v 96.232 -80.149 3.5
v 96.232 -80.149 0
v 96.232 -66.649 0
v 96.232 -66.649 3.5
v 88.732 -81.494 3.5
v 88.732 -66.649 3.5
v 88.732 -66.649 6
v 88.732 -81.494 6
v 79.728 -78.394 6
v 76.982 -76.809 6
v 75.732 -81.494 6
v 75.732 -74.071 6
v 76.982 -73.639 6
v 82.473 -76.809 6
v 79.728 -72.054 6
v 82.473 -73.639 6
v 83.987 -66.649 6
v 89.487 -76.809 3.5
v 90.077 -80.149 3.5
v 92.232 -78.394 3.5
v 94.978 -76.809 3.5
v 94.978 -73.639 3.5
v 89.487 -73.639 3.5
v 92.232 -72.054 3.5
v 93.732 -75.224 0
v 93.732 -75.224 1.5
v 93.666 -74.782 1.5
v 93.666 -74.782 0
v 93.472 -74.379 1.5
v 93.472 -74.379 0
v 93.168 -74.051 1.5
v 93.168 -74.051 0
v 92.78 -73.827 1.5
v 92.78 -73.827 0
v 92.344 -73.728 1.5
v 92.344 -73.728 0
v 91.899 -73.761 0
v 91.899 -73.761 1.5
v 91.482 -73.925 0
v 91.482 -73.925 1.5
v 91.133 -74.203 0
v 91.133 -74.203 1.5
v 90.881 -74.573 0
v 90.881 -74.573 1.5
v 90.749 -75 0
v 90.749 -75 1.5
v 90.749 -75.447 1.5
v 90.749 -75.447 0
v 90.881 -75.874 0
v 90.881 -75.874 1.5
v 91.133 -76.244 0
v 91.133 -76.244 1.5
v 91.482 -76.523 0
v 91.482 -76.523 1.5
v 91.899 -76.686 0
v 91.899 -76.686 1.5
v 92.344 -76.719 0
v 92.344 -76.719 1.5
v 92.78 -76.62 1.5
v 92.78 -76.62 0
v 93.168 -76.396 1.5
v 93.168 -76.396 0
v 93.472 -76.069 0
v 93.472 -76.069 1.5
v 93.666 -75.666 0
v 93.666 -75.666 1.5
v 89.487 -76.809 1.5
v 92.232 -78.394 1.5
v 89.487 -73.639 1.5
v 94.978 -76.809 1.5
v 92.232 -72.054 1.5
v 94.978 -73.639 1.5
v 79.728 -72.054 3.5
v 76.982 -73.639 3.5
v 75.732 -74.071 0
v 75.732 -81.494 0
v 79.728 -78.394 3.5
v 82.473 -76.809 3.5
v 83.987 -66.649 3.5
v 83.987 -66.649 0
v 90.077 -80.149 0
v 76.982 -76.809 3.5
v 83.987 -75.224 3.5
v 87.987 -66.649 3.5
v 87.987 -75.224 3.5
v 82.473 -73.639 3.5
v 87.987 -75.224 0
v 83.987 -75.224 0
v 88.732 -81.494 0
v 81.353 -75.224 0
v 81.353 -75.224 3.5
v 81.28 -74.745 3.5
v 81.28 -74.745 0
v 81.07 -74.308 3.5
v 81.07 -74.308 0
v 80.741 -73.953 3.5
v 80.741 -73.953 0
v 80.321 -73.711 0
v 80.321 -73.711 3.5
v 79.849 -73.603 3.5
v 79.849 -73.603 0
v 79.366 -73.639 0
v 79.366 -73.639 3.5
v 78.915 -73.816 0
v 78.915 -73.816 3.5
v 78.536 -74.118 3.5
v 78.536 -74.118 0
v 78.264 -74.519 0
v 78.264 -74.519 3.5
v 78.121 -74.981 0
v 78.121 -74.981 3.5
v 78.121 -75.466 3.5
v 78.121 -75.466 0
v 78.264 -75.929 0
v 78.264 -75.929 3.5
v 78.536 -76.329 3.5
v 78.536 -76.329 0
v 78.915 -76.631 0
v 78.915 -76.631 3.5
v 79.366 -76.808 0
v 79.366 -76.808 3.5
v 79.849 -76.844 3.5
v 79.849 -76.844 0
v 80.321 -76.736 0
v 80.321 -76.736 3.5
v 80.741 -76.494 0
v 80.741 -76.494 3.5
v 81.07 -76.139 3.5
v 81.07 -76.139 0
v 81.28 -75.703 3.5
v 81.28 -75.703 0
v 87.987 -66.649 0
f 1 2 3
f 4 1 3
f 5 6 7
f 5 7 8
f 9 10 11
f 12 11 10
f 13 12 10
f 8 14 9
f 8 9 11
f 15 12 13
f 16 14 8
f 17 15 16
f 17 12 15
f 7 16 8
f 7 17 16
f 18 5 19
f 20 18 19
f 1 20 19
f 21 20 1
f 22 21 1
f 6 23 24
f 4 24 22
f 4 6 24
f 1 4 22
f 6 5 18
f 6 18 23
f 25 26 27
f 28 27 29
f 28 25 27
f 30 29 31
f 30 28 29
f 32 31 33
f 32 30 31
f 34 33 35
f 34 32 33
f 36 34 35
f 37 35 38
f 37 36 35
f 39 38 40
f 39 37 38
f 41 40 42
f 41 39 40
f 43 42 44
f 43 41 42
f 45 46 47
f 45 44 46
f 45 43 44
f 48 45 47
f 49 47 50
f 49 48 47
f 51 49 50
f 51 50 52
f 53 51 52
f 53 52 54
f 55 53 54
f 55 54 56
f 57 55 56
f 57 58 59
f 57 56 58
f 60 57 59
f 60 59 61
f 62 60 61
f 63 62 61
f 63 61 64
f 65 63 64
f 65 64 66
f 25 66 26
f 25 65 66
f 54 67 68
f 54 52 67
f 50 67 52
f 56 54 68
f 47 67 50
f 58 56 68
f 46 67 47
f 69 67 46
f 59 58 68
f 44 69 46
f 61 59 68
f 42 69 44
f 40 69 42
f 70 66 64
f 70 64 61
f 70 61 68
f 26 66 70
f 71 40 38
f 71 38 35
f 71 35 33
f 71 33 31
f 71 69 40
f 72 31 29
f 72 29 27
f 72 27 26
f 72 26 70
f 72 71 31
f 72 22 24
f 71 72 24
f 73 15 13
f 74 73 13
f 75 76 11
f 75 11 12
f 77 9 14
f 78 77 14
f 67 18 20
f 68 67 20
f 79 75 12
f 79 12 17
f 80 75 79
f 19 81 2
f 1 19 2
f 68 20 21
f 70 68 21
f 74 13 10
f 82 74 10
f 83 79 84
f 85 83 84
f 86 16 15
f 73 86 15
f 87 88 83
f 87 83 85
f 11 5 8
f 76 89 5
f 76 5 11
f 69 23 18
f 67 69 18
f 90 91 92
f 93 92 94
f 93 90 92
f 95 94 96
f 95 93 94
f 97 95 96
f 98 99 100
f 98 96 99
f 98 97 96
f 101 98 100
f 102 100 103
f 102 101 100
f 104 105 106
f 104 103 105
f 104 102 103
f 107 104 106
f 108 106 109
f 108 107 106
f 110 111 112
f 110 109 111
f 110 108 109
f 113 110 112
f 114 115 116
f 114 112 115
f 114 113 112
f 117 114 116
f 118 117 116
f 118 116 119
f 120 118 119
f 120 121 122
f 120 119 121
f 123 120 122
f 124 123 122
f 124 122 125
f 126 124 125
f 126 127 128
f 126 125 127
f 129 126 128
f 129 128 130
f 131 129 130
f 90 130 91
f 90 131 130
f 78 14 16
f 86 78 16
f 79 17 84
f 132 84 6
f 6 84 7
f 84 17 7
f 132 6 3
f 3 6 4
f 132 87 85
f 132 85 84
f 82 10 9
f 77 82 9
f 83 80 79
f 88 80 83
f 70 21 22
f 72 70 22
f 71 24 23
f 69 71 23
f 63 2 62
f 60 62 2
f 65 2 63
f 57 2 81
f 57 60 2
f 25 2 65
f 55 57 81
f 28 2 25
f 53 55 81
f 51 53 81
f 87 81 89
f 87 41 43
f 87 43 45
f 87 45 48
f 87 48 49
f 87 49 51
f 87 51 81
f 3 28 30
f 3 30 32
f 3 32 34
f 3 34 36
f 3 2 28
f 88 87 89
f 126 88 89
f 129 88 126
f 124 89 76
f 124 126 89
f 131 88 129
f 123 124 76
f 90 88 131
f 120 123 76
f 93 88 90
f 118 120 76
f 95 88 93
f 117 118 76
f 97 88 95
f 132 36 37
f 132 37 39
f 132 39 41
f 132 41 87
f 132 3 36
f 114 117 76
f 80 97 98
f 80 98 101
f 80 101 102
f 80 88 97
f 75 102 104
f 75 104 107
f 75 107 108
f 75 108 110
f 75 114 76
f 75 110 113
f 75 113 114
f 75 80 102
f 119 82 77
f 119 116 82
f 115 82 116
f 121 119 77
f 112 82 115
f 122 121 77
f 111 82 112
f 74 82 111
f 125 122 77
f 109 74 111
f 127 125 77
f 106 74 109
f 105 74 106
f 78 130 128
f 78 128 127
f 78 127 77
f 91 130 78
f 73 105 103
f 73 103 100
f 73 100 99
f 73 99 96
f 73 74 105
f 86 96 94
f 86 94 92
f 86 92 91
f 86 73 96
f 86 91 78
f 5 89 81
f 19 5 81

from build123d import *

# Parameters (mm, degrees)
CROQUIS1_R                   = 1.5
SALIENTE_EXTRUIR1_DEPTH      = 3.5
CORTAR_EXTRUIR1_DEPTH        = 2
SALIENTE_EXTRUIR2_DEPTH      = 2.5
SALIENTE_EXTRUIR2_DEPTH_BACK = 3.5
CROQUIS3_R                   = 1.625
CROQUIS4_W                   = 4
CROQUIS4_H                   = 8.575
SALIENTE_EXTRUIR3_DEPTH      = 2.5
CORTAR_EXTRUIR2_DEPTH        = 2.5


with BuildPart() as part:
    # Croquis1 → Saliente-Extruir1 (new body)
    with BuildSketch(Plane.XY):
        Polygon((88.732371, -80.148646), (88.732371, -81.493646), (90.077371, -80.148646), (96.232371, -80.148646), (96.232371, -66.648646), (88.732371, -66.648646), align=None)
        with Locations((92.232371, -75.223646)):
            Circle(CROQUIS1_R, mode=Mode.SUBTRACT)
    extrude(amount=SALIENTE_EXTRUIR1_DEPTH)

    # Croquis2 → Cortar-Extruir1 (cut)
    with BuildSketch(Plane.XY.offset(3.5)):
        Polygon((92.232371, -72.053646), (89.48707047, -73.638646), (89.48707047, -76.808646), (92.232371, -78.393646), (94.97767153, -76.808646), (94.97767153, -73.638646), align=None)
    extrude(amount=-CORTAR_EXTRUIR1_DEPTH, mode=Mode.SUBTRACT)

    # Croquis3 → Saliente-Extruir2 (add, two sides: drawn at the far end of the back side and taken through both)
    with BuildSketch(Plane.XY.offset(3.5).offset(-SALIENTE_EXTRUIR2_DEPTH_BACK)):
        Polygon((88.732371, -81.493646), (75.732371, -81.493646), (75.732371, -74.071146), (83.98707047, -66.648646), (83.98707047, -75.223646), (87.98707047, -75.223646), (87.98707047, -66.648646), (88.732371, -66.648646), align=None)
        with Locations((79.72767153, -75.223646)):
            Circle(CROQUIS3_R, mode=Mode.SUBTRACT)
    extrude(amount=SALIENTE_EXTRUIR2_DEPTH + SALIENTE_EXTRUIR2_DEPTH_BACK)

    # Croquis4 → Saliente-Extruir3 (add)
    with BuildSketch(Plane.XY.offset(6)):
        with Locations((85.98707047, -70.936146)):
            Rectangle(CROQUIS4_W, CROQUIS4_H)
    extrude(amount=-SALIENTE_EXTRUIR3_DEPTH)

    # Croquis5 → Cortar-Extruir2 (cut)
    with BuildSketch(Plane.XY.offset(6)):
        Polygon((79.72767153, -78.393646), (82.47297206, -76.808646), (82.47297206, -73.638646), (79.72767153, -72.053646), (76.982371, -73.638646), (76.982371, -76.808646), align=None)
    extrude(amount=-CORTAR_EXTRUIR2_DEPTH, mode=Mode.SUBTRACT)


solid = part.part
